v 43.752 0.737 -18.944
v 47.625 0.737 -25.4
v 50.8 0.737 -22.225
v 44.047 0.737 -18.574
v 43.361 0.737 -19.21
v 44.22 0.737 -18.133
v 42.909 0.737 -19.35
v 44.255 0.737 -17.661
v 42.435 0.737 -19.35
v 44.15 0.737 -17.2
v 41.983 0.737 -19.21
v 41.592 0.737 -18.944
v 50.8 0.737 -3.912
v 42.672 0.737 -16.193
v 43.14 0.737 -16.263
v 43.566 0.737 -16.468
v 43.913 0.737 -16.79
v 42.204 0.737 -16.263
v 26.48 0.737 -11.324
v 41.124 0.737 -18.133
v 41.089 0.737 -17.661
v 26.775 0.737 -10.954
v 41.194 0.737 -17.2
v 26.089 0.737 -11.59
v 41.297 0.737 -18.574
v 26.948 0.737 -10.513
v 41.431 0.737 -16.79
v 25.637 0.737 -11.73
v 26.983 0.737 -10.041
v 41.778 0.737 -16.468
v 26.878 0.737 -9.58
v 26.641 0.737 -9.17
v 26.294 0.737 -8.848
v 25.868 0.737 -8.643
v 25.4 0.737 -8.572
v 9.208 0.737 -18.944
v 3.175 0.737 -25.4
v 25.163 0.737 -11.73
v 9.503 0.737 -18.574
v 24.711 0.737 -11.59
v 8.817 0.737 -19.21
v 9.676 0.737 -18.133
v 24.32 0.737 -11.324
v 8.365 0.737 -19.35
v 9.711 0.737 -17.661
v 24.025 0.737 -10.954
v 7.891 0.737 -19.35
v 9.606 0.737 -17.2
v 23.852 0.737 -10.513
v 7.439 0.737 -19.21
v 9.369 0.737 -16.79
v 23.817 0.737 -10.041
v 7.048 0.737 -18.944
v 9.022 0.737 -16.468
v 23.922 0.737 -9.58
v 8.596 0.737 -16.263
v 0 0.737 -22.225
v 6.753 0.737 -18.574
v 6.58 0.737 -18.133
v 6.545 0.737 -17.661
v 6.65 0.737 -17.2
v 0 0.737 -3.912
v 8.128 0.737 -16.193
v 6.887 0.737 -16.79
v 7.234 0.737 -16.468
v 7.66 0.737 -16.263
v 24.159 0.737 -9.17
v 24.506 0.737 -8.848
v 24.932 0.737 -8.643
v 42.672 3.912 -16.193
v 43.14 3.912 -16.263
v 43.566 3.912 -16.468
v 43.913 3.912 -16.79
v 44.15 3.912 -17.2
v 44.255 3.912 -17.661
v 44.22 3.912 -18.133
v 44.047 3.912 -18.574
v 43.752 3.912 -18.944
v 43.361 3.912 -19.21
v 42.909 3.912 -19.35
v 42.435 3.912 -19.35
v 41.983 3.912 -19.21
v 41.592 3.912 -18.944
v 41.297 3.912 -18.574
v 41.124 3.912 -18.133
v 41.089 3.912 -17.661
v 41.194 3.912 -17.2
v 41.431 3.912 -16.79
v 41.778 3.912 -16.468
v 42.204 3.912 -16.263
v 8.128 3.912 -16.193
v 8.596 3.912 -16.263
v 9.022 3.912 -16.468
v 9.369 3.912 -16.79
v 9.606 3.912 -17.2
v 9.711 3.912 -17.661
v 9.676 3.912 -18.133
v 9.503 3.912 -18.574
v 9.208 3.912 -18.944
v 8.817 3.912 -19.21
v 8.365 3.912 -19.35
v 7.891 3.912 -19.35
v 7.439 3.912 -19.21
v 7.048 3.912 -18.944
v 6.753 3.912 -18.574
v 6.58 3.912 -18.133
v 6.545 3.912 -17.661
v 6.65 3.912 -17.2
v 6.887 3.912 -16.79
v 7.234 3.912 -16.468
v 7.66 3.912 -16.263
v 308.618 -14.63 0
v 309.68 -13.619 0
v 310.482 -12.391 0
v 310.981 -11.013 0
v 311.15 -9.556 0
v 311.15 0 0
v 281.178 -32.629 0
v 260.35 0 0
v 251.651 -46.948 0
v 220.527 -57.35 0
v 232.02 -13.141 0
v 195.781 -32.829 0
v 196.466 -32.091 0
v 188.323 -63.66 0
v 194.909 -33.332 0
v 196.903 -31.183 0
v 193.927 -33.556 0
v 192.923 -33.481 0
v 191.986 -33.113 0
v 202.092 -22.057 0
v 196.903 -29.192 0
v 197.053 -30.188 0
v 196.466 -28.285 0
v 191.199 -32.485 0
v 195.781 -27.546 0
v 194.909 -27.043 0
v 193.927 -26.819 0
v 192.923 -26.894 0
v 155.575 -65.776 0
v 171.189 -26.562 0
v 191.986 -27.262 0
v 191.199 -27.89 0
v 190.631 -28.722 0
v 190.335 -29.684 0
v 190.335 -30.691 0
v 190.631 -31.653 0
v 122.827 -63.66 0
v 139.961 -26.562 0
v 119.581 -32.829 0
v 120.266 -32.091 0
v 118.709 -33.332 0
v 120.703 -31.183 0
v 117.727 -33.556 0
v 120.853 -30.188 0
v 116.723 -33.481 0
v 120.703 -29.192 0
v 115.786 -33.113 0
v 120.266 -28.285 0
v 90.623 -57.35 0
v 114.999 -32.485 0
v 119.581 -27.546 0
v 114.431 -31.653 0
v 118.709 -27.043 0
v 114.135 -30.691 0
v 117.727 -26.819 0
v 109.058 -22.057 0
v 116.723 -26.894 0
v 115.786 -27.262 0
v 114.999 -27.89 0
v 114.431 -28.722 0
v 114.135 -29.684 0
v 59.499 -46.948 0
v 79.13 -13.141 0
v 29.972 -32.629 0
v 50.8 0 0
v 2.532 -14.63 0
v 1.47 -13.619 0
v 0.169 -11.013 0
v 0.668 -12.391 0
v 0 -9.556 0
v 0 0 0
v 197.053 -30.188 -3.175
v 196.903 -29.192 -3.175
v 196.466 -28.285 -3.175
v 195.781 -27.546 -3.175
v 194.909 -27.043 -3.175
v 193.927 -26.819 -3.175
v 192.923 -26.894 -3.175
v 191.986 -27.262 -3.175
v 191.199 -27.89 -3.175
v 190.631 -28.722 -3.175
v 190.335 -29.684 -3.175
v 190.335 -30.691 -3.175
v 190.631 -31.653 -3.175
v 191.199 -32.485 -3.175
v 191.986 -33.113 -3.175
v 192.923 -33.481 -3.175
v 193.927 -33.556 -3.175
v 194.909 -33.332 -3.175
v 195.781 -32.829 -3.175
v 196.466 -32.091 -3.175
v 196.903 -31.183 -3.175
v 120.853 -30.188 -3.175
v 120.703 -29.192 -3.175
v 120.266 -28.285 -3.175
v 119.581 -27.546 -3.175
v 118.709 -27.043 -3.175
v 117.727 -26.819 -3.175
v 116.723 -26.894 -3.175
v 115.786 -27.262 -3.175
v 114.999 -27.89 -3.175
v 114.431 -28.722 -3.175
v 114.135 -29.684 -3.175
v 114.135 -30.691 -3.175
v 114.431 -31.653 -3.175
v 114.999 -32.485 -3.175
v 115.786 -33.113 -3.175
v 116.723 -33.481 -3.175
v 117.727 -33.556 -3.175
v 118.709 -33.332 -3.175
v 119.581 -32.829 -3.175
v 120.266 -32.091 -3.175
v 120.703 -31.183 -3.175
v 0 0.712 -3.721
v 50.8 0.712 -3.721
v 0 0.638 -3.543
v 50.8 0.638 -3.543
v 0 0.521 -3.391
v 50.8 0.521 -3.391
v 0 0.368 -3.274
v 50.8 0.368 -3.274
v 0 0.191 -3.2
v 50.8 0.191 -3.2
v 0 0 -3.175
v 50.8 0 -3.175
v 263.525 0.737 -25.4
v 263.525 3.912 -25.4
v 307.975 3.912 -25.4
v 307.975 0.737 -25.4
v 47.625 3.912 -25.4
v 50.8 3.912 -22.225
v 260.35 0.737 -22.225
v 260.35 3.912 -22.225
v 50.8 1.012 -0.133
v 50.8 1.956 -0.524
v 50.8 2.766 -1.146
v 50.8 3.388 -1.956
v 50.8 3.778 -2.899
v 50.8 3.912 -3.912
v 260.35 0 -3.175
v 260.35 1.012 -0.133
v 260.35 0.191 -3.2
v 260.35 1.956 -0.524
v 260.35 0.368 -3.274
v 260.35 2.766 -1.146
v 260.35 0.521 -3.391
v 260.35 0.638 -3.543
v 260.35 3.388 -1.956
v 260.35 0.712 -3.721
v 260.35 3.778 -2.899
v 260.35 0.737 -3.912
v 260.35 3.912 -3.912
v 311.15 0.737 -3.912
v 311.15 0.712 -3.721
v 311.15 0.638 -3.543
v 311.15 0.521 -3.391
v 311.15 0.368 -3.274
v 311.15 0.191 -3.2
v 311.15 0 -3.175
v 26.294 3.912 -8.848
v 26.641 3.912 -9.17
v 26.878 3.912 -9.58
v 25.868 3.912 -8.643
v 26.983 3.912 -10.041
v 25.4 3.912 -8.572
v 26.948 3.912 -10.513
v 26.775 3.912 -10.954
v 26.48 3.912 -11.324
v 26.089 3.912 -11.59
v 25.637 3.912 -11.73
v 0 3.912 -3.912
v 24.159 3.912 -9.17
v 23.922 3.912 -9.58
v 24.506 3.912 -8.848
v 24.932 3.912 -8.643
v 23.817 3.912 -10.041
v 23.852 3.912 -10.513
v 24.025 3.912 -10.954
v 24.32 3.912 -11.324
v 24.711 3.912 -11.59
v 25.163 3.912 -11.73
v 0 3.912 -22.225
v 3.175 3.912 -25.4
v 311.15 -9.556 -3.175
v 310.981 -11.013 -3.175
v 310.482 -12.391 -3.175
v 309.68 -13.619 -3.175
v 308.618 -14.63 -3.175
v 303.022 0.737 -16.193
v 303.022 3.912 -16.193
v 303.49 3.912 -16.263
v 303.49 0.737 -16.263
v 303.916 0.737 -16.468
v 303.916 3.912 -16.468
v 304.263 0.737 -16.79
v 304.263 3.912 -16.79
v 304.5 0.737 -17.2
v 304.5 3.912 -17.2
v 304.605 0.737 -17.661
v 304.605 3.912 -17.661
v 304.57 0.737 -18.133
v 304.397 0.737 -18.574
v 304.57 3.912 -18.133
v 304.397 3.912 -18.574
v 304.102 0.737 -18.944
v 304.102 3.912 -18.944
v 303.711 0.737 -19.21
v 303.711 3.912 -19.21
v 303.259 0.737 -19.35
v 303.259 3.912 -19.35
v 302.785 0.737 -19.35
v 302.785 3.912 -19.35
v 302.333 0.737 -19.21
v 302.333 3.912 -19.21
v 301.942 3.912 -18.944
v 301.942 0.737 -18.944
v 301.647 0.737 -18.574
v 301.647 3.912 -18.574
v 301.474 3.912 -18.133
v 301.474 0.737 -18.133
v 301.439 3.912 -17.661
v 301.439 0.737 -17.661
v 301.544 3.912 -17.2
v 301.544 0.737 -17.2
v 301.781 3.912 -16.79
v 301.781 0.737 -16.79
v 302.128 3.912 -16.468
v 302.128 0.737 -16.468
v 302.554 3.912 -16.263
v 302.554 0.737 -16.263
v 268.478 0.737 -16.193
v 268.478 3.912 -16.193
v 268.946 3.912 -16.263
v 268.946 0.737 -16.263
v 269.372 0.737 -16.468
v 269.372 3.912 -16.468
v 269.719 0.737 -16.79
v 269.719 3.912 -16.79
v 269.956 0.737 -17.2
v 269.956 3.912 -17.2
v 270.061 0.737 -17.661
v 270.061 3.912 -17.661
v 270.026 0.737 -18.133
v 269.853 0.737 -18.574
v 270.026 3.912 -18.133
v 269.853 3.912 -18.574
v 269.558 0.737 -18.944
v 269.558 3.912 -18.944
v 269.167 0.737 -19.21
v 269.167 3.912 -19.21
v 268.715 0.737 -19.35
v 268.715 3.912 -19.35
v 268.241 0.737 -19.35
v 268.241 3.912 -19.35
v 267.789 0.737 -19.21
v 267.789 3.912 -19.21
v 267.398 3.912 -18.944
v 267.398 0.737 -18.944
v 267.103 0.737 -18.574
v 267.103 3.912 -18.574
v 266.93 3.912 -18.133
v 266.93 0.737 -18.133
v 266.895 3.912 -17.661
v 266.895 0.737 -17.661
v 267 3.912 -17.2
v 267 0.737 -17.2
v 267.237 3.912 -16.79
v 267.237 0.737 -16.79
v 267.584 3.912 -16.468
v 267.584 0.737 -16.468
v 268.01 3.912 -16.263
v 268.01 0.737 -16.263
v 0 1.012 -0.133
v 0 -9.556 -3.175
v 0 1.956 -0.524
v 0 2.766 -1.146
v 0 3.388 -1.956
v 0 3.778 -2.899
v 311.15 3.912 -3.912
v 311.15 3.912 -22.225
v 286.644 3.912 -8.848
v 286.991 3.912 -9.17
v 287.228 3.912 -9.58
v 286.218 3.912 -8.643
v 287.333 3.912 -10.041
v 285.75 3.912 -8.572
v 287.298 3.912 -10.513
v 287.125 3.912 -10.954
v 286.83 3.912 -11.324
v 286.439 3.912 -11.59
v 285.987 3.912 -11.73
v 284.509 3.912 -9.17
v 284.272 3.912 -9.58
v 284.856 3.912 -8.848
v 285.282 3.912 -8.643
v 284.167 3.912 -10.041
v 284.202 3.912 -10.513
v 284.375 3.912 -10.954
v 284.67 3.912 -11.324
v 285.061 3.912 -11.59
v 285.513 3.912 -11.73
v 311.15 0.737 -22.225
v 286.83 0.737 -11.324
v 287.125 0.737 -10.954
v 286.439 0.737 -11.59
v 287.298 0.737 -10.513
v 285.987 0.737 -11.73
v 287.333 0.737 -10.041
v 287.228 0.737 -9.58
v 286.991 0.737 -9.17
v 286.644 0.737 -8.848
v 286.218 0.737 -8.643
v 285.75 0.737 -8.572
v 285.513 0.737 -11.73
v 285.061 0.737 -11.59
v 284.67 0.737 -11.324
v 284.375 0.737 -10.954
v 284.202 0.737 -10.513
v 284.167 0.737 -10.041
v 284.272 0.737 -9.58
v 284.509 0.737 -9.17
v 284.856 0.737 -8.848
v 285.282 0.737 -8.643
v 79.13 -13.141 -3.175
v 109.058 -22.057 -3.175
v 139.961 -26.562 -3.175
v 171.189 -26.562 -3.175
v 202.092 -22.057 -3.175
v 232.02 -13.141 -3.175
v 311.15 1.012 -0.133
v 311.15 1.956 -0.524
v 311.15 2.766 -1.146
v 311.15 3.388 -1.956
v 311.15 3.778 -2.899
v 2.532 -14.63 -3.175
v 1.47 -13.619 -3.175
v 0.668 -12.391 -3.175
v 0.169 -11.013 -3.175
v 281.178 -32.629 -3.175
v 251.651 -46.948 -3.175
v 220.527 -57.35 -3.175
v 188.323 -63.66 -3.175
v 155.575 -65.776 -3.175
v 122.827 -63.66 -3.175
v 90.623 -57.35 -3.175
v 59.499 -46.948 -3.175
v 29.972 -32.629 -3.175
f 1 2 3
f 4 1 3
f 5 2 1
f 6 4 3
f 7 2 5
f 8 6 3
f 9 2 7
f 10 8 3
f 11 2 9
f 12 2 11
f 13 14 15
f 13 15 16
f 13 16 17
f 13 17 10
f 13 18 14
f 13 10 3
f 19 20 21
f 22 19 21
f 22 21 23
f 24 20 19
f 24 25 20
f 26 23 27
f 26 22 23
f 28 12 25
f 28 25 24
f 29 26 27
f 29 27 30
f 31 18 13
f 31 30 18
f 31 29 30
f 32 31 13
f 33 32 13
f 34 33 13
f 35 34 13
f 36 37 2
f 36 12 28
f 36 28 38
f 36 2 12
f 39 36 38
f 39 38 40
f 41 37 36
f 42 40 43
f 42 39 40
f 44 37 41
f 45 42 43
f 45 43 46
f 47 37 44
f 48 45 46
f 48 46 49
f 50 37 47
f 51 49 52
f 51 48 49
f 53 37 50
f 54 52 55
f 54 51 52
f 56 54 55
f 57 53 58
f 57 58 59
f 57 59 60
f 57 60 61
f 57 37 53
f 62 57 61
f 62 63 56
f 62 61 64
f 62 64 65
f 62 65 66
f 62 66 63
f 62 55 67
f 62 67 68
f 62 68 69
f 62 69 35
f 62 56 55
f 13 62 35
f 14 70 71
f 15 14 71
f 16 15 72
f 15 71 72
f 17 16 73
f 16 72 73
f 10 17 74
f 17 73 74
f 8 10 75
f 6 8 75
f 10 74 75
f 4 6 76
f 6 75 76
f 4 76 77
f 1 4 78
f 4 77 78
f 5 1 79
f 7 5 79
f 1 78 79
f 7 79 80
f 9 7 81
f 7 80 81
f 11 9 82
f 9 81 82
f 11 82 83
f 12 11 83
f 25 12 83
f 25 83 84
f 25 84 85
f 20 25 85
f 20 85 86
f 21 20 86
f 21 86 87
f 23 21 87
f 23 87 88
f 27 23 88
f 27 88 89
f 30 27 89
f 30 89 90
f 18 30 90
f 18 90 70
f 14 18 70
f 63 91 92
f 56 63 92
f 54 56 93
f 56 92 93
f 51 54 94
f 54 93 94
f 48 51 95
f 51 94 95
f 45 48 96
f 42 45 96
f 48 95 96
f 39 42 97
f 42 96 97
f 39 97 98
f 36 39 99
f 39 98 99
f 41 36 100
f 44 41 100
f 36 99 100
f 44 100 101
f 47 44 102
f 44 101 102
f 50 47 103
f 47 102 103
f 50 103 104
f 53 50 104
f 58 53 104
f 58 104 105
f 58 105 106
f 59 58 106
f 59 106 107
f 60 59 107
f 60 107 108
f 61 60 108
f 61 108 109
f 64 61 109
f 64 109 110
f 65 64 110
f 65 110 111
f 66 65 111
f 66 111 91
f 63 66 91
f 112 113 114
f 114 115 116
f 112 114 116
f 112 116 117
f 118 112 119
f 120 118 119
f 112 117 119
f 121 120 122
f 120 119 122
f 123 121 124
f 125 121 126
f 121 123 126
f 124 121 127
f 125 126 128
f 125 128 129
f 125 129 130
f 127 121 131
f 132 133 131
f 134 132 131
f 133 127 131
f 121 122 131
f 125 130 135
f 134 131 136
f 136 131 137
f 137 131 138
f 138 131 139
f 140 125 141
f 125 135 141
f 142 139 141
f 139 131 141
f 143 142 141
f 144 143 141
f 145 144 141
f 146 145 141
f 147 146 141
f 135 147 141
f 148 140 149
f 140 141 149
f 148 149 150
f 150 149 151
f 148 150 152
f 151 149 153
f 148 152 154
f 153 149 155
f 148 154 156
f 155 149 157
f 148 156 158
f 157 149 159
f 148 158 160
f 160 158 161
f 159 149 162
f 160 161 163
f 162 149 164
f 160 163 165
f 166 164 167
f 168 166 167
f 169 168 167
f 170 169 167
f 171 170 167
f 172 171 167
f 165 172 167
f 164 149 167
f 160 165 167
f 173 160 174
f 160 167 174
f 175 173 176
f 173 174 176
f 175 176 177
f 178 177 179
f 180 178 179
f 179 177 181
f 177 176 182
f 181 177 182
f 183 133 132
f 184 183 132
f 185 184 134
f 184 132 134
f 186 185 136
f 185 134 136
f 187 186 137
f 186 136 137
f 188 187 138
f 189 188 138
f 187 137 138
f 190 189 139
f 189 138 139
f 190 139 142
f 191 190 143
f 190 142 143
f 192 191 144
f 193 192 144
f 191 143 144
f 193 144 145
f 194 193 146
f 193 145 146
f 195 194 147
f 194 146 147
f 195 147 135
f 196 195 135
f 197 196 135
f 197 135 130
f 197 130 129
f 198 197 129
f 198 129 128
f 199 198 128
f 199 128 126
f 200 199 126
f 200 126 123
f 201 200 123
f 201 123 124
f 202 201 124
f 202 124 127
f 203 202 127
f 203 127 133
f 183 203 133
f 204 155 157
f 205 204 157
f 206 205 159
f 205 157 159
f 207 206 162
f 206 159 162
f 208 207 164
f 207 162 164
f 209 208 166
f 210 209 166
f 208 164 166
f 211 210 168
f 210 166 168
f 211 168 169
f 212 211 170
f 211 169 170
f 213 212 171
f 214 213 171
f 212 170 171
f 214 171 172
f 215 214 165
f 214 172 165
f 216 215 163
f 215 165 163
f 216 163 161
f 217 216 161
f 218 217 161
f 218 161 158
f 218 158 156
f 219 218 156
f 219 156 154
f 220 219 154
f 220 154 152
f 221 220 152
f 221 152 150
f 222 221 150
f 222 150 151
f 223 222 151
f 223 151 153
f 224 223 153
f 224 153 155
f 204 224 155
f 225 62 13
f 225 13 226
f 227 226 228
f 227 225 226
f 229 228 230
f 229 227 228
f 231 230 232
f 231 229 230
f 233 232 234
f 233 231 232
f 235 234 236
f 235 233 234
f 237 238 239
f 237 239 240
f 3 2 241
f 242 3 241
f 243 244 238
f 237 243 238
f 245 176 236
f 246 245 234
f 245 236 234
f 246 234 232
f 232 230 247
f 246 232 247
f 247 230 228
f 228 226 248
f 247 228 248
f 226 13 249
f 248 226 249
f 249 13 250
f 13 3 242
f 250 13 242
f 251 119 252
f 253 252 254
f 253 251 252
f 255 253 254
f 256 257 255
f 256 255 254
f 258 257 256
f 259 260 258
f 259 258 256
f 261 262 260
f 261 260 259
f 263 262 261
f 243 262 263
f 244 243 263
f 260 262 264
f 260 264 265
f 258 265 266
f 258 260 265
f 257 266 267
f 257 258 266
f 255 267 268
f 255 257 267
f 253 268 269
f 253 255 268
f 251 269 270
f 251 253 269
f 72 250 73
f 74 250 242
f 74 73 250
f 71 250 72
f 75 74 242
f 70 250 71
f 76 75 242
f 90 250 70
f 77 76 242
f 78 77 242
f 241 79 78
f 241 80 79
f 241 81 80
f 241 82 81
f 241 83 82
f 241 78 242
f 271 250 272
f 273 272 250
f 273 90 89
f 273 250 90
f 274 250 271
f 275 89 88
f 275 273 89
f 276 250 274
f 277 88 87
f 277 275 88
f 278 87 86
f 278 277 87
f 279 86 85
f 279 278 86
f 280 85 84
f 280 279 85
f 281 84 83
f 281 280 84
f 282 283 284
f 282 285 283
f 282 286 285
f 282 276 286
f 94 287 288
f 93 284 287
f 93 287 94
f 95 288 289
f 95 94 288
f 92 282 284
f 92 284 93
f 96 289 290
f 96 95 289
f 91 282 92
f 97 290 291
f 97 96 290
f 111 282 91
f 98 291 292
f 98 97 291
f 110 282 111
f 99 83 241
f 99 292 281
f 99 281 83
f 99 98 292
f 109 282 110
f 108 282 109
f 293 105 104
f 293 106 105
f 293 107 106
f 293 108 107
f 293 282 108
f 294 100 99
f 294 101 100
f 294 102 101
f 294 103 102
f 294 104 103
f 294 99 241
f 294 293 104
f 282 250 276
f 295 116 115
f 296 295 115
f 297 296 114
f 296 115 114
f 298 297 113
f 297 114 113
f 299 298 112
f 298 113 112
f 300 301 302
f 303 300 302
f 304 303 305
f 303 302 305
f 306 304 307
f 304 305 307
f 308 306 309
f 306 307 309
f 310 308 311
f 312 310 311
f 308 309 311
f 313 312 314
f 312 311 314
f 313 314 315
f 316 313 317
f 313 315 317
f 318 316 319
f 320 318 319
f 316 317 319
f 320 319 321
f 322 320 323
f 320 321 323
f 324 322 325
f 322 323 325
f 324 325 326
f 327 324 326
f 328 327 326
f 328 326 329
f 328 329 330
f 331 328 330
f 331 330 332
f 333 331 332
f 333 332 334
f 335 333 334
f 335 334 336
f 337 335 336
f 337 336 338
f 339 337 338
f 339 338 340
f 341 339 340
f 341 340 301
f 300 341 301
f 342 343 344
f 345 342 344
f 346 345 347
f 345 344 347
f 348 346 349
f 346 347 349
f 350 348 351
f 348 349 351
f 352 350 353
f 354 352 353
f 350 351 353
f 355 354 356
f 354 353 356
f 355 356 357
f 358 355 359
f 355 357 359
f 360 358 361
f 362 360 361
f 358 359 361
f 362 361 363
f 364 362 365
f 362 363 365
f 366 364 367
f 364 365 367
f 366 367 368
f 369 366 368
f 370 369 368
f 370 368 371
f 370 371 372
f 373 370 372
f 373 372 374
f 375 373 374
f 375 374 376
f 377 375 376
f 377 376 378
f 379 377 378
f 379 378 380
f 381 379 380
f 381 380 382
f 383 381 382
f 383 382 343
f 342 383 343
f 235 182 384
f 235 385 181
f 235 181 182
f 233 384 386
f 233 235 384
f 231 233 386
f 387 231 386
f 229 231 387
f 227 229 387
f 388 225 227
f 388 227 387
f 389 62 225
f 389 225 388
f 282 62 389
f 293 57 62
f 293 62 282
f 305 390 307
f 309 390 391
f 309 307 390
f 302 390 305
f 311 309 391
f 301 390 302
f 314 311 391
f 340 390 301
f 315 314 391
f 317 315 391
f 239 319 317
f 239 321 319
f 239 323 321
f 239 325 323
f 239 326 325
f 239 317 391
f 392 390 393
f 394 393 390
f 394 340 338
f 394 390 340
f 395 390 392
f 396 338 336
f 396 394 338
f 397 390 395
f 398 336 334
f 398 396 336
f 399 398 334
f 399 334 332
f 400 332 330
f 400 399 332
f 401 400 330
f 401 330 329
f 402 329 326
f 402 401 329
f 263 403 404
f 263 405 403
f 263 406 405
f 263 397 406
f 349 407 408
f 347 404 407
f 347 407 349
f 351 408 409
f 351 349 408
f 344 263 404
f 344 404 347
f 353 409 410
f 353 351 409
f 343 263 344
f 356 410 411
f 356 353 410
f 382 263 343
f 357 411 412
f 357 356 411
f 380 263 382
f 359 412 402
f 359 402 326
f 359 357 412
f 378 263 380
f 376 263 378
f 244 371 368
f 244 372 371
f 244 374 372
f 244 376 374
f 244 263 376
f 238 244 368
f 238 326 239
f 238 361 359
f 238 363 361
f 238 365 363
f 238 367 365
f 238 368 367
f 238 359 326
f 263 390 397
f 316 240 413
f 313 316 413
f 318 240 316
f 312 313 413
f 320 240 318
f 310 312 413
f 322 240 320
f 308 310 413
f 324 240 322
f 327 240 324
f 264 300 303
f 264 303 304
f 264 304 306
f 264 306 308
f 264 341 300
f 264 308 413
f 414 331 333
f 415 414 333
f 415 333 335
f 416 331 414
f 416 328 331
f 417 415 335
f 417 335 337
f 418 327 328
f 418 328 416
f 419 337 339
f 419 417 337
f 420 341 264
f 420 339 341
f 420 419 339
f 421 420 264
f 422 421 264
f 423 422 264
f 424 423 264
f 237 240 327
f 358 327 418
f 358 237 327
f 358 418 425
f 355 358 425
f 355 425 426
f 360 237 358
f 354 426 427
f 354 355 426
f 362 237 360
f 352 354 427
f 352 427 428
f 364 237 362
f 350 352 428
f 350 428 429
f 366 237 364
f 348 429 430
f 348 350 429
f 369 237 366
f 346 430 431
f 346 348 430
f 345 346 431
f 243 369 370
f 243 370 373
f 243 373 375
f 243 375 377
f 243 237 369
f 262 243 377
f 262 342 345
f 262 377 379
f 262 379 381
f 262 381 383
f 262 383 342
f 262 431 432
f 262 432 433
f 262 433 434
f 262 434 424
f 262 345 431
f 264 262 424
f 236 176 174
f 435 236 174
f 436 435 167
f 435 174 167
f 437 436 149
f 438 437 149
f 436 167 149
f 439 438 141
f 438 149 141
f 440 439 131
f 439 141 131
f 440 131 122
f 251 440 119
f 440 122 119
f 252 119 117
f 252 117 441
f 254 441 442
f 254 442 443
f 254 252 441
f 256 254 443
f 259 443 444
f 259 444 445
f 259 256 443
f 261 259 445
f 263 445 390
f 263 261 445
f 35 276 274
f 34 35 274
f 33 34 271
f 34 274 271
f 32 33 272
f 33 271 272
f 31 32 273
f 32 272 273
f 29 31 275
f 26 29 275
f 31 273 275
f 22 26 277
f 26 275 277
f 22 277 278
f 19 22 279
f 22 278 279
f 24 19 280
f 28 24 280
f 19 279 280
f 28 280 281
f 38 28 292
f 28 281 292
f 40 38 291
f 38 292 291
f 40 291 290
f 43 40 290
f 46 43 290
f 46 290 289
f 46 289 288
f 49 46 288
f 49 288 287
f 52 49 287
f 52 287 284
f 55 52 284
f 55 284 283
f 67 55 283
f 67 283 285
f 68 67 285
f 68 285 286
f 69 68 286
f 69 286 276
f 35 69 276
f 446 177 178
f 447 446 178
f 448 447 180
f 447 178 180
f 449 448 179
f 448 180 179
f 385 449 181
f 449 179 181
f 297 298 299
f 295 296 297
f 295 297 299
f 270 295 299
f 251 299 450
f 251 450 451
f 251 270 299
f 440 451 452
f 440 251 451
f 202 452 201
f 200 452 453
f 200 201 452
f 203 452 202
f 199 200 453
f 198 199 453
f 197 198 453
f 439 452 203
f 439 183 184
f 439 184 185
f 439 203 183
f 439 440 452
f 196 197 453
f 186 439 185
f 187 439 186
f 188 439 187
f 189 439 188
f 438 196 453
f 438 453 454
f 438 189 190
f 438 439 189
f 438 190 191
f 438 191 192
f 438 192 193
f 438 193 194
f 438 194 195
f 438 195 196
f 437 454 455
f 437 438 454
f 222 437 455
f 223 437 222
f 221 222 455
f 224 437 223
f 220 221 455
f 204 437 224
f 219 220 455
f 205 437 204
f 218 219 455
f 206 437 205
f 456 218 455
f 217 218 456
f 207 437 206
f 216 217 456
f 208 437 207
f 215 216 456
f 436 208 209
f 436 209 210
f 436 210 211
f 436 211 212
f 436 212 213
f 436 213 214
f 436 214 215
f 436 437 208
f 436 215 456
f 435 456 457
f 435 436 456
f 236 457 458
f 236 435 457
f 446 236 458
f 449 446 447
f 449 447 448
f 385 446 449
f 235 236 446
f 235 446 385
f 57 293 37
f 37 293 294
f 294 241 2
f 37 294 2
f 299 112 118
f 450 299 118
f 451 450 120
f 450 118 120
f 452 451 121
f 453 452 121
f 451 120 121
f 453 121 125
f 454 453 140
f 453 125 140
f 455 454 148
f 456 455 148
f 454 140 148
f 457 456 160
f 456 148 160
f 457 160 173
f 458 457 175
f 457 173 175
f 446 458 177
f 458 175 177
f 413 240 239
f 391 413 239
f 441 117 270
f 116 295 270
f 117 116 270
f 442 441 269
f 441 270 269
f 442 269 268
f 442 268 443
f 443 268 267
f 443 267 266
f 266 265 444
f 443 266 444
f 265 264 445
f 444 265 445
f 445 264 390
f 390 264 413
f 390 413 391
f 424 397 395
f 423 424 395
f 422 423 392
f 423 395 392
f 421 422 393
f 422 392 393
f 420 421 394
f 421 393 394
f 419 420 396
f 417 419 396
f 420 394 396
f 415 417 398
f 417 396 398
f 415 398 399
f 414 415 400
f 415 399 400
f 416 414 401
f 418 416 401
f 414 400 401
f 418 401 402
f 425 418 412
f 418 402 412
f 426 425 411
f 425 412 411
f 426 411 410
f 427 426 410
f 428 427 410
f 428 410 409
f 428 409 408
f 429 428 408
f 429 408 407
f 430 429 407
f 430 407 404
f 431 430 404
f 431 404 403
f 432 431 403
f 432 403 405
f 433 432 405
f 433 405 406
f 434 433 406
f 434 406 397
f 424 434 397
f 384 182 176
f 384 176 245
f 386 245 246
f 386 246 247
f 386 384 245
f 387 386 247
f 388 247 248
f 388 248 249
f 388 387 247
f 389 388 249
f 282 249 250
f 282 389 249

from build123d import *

# Parameters (mm, degrees)
BASE_FLANGE1_DEPTH        = 3.175
EDGE_FLANGE1_DEPTH        = 50.8
EDGE_FLANGE1_BEND_DEPTH   = 50.8
SKETCH25_R                = 3.3782
CUT_EXTRUDE1_DEPTH        = 320.039055649
BREAK_CORNER1_START       = 15.715448212
BREAK_CORNER1_OUTLINE_W   = 184.095250482
BREAK_CORNER1_OUTLINE_H   = 6
BREAK_CORNER1_DEPTH       = 152.664354058
BREAK_CORNER1_START_2     = -17.960512242
BREAK_CORNER1_2_OUTLINE_W = 37.636472696
BREAK_CORNER1_2_OUTLINE_H = 6
BREAK_CORNER1_2_DEPTH     = 2.24506403
BREAK_CORNER1_START_3     = 199.810698694
BREAK_CORNER1_3_OUTLINE_W = 2.268276822
BREAK_CORNER1_3_OUTLINE_H = 6
BREAK_CORNER1_3_DEPTH     = 4.49012806
SKETCH26_R                = 1.5875
CUT_EXTRUDE2_DEPTH        = 320.868403774
SKETCH27_R                = 1.5875
CUT_EXTRUDE3_DEPTH        = 320.868403774


# Read off the part's stored shape, not the designer's step: Break-Corner1
# Sheet-metal steps are written as plain solids
with BuildPart() as part:
    # Sketch2 → Base-Flange1 (new body)
    with BuildSketch(Plane.XY):
        with BuildLine():
            Line((0, 0), (50.8, 0))
            ThreePointArc((50.8, 0), (155.575, -27.127625498), (260.35, 0))
            Line((260.35, 0), (311.15, 0))
            Line((311.15, 0), (311.15, -9.556040603))
            ThreePointArc((311.15, -9.556040603), (310.481801777, -12.39146448), (308.617833524, -14.630156012))
            ThreePointArc((308.617833524, -14.630156012), (155.575, -65.775653014), (2.532166476, -14.630156012))
            ThreePointArc((2.532166476, -14.630156012), (0.668198223, -12.39146448), (0, -9.556040603))
            Line((0, -9.556040603), (0, 0))
        make_face()
    extrude(amount=-BASE_FLANGE1_DEPTH)

    # Edge-Flange1 section (across the edge) → Edge-Flange1 (add)
    with BuildSketch(Plane(origin=(0, 0.7366, -3.175), x_dir=(0, -1, 0), z_dir=(1, 0, 0))):
        with BuildLine():
            Line((-3.175, 0.7366), (-3.175, 22.225))
            Line((-3.175, 22.225), (0, 22.225))
            Line((0, 22.225), (0, 0.7366))
            ThreePointArc((0, 0.7366), (0.215745145, 0.215745145), (0.7366, 0))
            Line((0.7366, 0), (0.7366, -3.175))
            ThreePointArc((0.7366, -3.175), (-2.029318885, -2.029318885), (-3.175, 0.7366))
        make_face()
    extrude(amount=EDGE_FLANGE1_DEPTH)

    # Edge-Flange1 section 2 (across the edge) → Edge-Flange1 bend (add)
    with BuildSketch(Plane(origin=(260.35, 0.7366, -3.175), x_dir=(0, -1, 0), z_dir=(1, 0, 0))):
        with BuildLine():
            Line((-3.175, 0.7366), (-3.175, 22.225))
            Line((-3.175, 22.225), (0, 22.225))
            Line((0, 22.225), (0, 0.7366))
            ThreePointArc((0, 0.7366), (0.215745145, 0.215745145), (0.7366, 0))
            Line((0.7366, 0), (0.7366, -3.175))
            ThreePointArc((0.7366, -3.175), (-2.029318885, -2.029318885), (-3.175, 0.7366))
        make_face()
    extrude(amount=EDGE_FLANGE1_BEND_DEPTH)

    # Sketch25 → Cut-Extrude1 (cut, through all)
    with BuildSketch(Plane.XY):
        with Locations((117.475, -30.187559048)):
            Circle(SKETCH25_R)
        with Locations((193.675, -30.187559048)):
            Circle(SKETCH25_R)
    extrude(amount=-CUT_EXTRUDE1_DEPTH, mode=Mode.SUBTRACT)

    # Break-Corner1 outline → Break-Corner1 (cut)
    with BuildSketch(Plane(origin=(0, 0, 0), x_dir=(0.707106781186548, 0, -0.707106781186547), z_dir=(0.707106781186547, 0, 0.707106781186548)).offset(BREAK_CORNER1_START)):
        with Locations((143.684097937, 2)):
            Rectangle(BREAK_CORNER1_OUTLINE_W, BREAK_CORNER1_OUTLINE_H)
    extrude(amount=BREAK_CORNER1_DEPTH, mode=Mode.SUBTRACT)

    # Break-Corner1 2 outline → Break-Corner1 2 (cut)
    with BuildSketch(Plane(origin=(0, 0, 0), x_dir=(0.707106781186548, 0, -0.707106781186547), z_dir=(0.707106781186547, 0, 0.707106781186548)).offset(BREAK_CORNER1_START_2)):
        with Locations((32.818236348, 2)):
            Rectangle(BREAK_CORNER1_2_OUTLINE_W, BREAK_CORNER1_2_OUTLINE_H)
    extrude(amount=BREAK_CORNER1_2_DEPTH, mode=Mode.SUBTRACT)

    # Break-Corner1 3 outline → Break-Corner1 3 (cut)
    with BuildSketch(Plane(origin=(0, 0, 0), x_dir=(0.707106781186548, 0, -0.707106781186547), z_dir=(0.707106781186547, 0, 0.707106781186548)).offset(BREAK_CORNER1_START_3)):
        with Locations((236.865861589, 2)):
            Rectangle(BREAK_CORNER1_3_OUTLINE_W, BREAK_CORNER1_3_OUTLINE_H)
    extrude(amount=BREAK_CORNER1_3_DEPTH, mode=Mode.SUBTRACT)

    # Sketch26 → Cut-Extrude2 (cut, through all)
    with BuildSketch(Plane(origin=(0, 3.9116, 0), x_dir=(1, 0, 0), z_dir=(0, 1, 0))):
        with Locations(Location((8.128, 17.78, 0), (0, 0, 270))):
            Circle(SKETCH26_R)
        with Locations(Location((25.4, 10.16, 0), (0, 0, 270))):
            Circle(SKETCH26_R)
        with Locations(Location((42.672, 17.78, 0), (0, 0, 270))):
            Circle(SKETCH26_R)
    extrude(amount=-CUT_EXTRUDE2_DEPTH, mode=Mode.SUBTRACT)

    # Sketch27 → Cut-Extrude3 (cut, through all)
    with BuildSketch(Plane(origin=(0, 3.9116, 0), x_dir=(1, 0, 0), z_dir=(0, 1, 0))):
        with Locations(Location((268.478, 17.78, 0), (0, 0, 270))):
            Circle(SKETCH27_R)
        with Locations(Location((303.022, 17.78, 0), (0, 0, 270))):
            Circle(SKETCH27_R)
        with Locations(Location((285.75, 10.16, 0), (0, 0, 270))):
            Circle(SKETCH27_R)
    extrude(amount=-CUT_EXTRUDE3_DEPTH, mode=Mode.SUBTRACT)


solid = part.part
